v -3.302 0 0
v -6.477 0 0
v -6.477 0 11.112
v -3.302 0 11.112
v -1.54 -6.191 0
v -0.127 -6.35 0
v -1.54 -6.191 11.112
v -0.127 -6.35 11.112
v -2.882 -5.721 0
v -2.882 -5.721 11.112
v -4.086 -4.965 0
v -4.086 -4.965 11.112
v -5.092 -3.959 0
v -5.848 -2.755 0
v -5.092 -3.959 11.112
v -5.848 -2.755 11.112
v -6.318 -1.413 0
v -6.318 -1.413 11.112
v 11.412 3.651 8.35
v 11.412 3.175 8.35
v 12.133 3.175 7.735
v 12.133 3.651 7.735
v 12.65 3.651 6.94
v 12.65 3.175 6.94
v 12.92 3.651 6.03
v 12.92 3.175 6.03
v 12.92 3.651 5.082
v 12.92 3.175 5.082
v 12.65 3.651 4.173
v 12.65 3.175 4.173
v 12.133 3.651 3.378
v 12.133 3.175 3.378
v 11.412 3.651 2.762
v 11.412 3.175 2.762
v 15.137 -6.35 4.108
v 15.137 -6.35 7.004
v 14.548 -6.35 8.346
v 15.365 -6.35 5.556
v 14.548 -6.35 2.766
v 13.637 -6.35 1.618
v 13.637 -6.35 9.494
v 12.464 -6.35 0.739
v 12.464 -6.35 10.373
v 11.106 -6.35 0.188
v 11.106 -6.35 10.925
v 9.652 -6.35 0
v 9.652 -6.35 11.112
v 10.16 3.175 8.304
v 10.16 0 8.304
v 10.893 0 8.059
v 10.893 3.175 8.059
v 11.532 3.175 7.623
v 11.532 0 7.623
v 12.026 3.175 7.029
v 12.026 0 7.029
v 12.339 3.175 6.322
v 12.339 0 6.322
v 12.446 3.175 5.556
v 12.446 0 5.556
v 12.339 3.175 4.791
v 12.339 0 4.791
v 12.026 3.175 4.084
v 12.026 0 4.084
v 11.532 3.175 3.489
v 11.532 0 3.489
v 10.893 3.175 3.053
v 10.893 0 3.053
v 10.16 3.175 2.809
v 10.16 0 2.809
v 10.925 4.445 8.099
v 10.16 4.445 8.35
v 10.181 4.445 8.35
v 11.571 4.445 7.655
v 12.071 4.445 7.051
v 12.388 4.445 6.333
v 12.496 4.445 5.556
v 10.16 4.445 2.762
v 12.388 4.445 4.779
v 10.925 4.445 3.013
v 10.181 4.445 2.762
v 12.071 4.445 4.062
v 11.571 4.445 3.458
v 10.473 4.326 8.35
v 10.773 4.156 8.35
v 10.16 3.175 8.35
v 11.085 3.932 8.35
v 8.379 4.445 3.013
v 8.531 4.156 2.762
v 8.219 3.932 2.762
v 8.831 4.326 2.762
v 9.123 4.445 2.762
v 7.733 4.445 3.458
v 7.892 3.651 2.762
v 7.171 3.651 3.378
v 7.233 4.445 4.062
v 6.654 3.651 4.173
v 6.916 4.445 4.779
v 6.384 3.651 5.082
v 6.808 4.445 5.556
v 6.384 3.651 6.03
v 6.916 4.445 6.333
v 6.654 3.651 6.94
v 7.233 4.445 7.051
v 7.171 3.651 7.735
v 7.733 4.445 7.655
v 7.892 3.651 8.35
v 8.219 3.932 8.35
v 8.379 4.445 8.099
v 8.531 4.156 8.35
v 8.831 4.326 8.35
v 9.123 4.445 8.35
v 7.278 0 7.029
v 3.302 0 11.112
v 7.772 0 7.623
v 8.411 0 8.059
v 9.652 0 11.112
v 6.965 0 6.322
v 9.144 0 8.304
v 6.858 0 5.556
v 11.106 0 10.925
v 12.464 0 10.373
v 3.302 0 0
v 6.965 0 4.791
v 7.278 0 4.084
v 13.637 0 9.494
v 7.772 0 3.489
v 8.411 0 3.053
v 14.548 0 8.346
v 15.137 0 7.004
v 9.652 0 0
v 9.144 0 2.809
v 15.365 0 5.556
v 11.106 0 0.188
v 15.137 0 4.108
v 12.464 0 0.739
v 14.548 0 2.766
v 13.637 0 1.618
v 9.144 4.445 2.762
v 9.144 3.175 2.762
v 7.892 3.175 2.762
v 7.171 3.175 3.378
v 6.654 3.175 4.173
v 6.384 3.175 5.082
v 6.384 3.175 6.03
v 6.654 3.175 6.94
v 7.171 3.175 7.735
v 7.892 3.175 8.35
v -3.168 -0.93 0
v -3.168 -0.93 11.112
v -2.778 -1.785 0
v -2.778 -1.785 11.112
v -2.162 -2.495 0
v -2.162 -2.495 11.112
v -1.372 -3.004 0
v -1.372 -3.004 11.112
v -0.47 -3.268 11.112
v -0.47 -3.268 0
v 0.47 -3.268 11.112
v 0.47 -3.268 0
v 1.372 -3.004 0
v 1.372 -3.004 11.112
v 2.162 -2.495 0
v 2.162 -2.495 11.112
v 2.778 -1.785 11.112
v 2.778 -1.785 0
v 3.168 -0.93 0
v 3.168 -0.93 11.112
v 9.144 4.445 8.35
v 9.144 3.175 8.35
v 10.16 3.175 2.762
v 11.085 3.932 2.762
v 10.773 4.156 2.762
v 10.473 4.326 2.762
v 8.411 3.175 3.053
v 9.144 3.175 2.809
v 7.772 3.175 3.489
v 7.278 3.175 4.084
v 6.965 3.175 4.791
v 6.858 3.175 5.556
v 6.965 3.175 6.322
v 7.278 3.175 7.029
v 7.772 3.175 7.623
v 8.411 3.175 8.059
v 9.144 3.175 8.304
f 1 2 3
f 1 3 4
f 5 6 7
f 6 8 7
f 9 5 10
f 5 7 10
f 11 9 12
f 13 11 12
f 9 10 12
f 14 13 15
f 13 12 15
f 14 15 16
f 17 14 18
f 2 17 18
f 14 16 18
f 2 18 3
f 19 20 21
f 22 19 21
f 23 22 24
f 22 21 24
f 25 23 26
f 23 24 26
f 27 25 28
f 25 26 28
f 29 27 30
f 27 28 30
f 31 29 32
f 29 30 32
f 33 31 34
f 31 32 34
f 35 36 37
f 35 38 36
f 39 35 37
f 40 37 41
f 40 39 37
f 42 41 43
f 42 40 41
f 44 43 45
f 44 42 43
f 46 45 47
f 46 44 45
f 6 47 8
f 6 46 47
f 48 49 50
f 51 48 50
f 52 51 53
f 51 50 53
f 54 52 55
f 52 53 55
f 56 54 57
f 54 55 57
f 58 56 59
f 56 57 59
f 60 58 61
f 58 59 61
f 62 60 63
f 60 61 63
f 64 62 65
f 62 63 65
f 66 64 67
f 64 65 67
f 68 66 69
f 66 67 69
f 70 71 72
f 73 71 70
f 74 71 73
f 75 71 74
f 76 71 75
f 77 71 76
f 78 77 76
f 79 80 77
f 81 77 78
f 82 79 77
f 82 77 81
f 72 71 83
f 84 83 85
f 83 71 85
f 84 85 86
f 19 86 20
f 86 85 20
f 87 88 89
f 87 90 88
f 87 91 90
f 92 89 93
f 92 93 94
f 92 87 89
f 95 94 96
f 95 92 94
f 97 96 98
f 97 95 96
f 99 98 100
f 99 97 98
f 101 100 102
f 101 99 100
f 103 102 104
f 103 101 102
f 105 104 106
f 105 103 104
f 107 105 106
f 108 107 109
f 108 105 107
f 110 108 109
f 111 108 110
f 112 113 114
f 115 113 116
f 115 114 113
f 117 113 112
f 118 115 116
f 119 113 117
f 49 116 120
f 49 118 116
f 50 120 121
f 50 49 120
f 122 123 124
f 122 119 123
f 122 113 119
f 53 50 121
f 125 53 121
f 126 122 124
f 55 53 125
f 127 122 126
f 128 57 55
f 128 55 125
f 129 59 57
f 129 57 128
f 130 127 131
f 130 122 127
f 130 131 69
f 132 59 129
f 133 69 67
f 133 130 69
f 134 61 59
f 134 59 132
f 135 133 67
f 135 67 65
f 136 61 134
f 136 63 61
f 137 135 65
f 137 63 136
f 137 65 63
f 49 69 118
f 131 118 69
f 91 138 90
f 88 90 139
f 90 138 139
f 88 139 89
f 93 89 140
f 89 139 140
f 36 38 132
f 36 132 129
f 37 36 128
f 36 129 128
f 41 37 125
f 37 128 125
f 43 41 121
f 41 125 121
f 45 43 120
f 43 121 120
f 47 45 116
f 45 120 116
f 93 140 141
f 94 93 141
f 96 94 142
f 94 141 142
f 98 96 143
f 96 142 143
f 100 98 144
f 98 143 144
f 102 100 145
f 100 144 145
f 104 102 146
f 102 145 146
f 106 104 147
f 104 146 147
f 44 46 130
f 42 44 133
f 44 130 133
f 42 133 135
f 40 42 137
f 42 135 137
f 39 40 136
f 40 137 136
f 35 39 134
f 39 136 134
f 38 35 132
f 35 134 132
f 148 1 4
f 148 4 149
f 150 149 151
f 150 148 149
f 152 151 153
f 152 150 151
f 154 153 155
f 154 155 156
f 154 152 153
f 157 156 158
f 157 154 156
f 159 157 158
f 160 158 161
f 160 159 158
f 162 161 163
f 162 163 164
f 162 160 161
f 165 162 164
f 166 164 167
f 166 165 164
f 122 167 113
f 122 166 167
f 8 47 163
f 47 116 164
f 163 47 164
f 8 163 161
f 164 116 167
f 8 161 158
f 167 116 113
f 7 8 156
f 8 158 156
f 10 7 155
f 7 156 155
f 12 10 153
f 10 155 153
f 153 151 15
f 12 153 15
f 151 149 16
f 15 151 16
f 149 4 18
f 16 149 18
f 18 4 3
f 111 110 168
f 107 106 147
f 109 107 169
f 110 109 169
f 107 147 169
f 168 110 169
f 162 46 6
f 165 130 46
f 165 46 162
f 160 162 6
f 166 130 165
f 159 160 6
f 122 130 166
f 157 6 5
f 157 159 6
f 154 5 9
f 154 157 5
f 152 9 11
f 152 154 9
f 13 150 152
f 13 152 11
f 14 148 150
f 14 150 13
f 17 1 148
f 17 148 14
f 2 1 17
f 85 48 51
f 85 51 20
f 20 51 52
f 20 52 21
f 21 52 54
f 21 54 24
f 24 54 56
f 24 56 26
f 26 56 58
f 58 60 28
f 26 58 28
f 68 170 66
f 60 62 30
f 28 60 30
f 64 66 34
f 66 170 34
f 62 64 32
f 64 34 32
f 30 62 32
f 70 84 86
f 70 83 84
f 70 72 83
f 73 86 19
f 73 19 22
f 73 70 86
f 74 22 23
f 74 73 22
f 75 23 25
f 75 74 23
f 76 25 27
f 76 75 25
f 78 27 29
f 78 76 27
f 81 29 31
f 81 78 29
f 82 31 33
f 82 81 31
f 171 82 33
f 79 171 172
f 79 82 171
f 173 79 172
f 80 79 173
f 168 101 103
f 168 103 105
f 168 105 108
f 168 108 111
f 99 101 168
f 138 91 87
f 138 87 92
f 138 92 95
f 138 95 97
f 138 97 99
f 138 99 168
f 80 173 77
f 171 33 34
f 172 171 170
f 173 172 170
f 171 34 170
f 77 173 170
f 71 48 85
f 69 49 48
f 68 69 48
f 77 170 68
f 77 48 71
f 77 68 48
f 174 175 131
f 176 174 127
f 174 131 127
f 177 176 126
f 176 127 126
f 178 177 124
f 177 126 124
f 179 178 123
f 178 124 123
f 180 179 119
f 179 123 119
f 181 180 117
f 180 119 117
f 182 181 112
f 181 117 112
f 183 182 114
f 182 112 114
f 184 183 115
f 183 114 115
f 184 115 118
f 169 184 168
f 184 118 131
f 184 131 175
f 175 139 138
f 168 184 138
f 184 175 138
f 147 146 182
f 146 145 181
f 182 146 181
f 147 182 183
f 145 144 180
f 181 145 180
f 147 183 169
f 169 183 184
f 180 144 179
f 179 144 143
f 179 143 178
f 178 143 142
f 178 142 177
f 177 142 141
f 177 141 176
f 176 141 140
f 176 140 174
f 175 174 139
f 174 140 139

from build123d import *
from OCP.BRepFilletAPI import BRepFilletAPI_MakeChamfer

# Parameters (mm, degrees)
BOSS_EXTRUDE1_DEPTH = 11.1125
FILLET1_R           = 6.35
FILLET2_R           = 5.715
SKETCH2_R           = 2.794
BOSS_EXTRUDE2_DEPTH = 3.175
BOSS_EXTRUDE3_DEPTH = 1.27
SKETCH4_W           = 1.016
SKETCH4_H           = 4.445
CUT_EXTRUDE2_DEPTH  = 20.997176622
CHAMFER1_SIZE       = 0.79375
CHAMFER1_SIZE2      = 0.458271776


# Some blends are built 0.0001 mm under size
with BuildPart() as part:
    # Sketch1 → Boss-Extrude1 (new body)
    with BuildSketch(Plane.XY):
        with BuildLine():
            Line((3.302, 0), (15.367, 0))
            Line((15.367, 0), (15.367, -6.35))
            Line((15.367, -6.35), (-6.477, -6.35))
            Line((-6.477, -6.35), (-6.477, 0))
            Line((-6.477, 0), (-3.302, 0))
            ThreePointArc((-3.302, 0), (0, -3.302), (3.302, 0))
        make_face()
    extrude(amount=BOSS_EXTRUDE1_DEPTH)

    # Fillet1
    fillet1_edges = [part.edges().sort_by_distance(p)[0] for p in [
        (-6.477, -6.35, 5.55625),
    ]]
    fillet(fillet1_edges, radius=FILLET1_R - 0.0001)  # a hair under: the kernel refuses the full size

    # Fillet2
    # the kernel refuses this fillet: 5.715 mm, written as the material it takes off along each edge
    with BuildSketch(Plane(origin=(15.367, 14.2875, 0), x_dir=(-1, 0, 0), z_dir=(0, -1, 0)), Plane(origin=(15.367, 14.2875, 11.1125), x_dir=(0, 0, -1), z_dir=(0, -1, 0))) as fillet2_piece_1:
        with BuildLine():
            CenterArc((FILLET2_R, -FILLET2_R), FILLET2_R, 90, 90)
            Line((0, -FILLET2_R), (0, 0))
            Line((0, 0), (FILLET2_R, 0))
        make_face()
    extrude(amount=34.925, mode=Mode.SUBTRACT)

    # Sketch2 → Boss-Extrude2 (add)
    with BuildSketch(Plane(origin=(0, 0, 0), x_dir=(1, 0, 0), z_dir=(0, 1, 0))):
        with Locations(Location((9.652, -5.55625, 0), (0, 0, 270))):
            Circle(SKETCH2_R)
    extrude(amount=BOSS_EXTRUDE2_DEPTH)

    # Sketch3 → Boss-Extrude3 (add)
    with BuildSketch(Plane(origin=(0, 3.175, 0), x_dir=(1, 0, 0), z_dir=(0, 1, 0))):
        with BuildLine():
            Line((7.89223638, -8.35025), (11.41176362, -8.35025))
            ThreePointArc((11.41176362, -8.35025), (12.954, -5.55625), (11.41176362, -2.76225))
            Line((11.41176362, -2.76225), (7.89223638, -2.76225))
            ThreePointArc((7.89223638, -2.76225), (6.35, -5.55625), (7.89223638, -8.35025))
        make_face()
    extrude(amount=BOSS_EXTRUDE3_DEPTH)

    # Sketch4 → Cut-Extrude2 (cut, through all)
    with BuildSketch(Plane.XY):
        with Locations((9.652, 2.2225)):
            Rectangle(SKETCH4_W, SKETCH4_H)
    extrude(amount=CUT_EXTRUDE2_DEPTH, mode=Mode.SUBTRACT)

    # Chamfer1: one chamfer whose edges measure the first distance from different faces: ONE call of the kernel's chamfer builder (chamfer() names one face for all edges)
    chamfer1_edges_1 = [part.edges().sort_by_distance(p)[0] for p in [
        (6.35, 4.445, 5.55625),
    ]]
    chamfer1_side_1 = [part.faces().sort_by_distance(p)[0] for p in [
        (6.35, 3.81, 5.55625),
    ]]
    chamfer1_edges_2 = [part.edges().sort_by_distance(p)[0] for p in [
        (12.954, 4.445, 5.55625),
    ]]
    chamfer1_side_2 = [part.faces().sort_by_distance(p)[0] for p in [
        (12.954, 3.81, 5.55625),
    ]]
    chamfer1 = BRepFilletAPI_MakeChamfer(part.part.solid().wrapped)
    for e in chamfer1_edges_1:
        chamfer1.Add(CHAMFER1_SIZE, CHAMFER1_SIZE2, e.wrapped, chamfer1_side_1[0].wrapped)  # the first distance lies on this face
    for e in chamfer1_edges_2:
        chamfer1.Add(CHAMFER1_SIZE, CHAMFER1_SIZE2, e.wrapped, chamfer1_side_2[0].wrapped)  # the first distance lies on this face
    add(Compound.cast(chamfer1.Shape()), mode=Mode.REPLACE)


solid = part.part
